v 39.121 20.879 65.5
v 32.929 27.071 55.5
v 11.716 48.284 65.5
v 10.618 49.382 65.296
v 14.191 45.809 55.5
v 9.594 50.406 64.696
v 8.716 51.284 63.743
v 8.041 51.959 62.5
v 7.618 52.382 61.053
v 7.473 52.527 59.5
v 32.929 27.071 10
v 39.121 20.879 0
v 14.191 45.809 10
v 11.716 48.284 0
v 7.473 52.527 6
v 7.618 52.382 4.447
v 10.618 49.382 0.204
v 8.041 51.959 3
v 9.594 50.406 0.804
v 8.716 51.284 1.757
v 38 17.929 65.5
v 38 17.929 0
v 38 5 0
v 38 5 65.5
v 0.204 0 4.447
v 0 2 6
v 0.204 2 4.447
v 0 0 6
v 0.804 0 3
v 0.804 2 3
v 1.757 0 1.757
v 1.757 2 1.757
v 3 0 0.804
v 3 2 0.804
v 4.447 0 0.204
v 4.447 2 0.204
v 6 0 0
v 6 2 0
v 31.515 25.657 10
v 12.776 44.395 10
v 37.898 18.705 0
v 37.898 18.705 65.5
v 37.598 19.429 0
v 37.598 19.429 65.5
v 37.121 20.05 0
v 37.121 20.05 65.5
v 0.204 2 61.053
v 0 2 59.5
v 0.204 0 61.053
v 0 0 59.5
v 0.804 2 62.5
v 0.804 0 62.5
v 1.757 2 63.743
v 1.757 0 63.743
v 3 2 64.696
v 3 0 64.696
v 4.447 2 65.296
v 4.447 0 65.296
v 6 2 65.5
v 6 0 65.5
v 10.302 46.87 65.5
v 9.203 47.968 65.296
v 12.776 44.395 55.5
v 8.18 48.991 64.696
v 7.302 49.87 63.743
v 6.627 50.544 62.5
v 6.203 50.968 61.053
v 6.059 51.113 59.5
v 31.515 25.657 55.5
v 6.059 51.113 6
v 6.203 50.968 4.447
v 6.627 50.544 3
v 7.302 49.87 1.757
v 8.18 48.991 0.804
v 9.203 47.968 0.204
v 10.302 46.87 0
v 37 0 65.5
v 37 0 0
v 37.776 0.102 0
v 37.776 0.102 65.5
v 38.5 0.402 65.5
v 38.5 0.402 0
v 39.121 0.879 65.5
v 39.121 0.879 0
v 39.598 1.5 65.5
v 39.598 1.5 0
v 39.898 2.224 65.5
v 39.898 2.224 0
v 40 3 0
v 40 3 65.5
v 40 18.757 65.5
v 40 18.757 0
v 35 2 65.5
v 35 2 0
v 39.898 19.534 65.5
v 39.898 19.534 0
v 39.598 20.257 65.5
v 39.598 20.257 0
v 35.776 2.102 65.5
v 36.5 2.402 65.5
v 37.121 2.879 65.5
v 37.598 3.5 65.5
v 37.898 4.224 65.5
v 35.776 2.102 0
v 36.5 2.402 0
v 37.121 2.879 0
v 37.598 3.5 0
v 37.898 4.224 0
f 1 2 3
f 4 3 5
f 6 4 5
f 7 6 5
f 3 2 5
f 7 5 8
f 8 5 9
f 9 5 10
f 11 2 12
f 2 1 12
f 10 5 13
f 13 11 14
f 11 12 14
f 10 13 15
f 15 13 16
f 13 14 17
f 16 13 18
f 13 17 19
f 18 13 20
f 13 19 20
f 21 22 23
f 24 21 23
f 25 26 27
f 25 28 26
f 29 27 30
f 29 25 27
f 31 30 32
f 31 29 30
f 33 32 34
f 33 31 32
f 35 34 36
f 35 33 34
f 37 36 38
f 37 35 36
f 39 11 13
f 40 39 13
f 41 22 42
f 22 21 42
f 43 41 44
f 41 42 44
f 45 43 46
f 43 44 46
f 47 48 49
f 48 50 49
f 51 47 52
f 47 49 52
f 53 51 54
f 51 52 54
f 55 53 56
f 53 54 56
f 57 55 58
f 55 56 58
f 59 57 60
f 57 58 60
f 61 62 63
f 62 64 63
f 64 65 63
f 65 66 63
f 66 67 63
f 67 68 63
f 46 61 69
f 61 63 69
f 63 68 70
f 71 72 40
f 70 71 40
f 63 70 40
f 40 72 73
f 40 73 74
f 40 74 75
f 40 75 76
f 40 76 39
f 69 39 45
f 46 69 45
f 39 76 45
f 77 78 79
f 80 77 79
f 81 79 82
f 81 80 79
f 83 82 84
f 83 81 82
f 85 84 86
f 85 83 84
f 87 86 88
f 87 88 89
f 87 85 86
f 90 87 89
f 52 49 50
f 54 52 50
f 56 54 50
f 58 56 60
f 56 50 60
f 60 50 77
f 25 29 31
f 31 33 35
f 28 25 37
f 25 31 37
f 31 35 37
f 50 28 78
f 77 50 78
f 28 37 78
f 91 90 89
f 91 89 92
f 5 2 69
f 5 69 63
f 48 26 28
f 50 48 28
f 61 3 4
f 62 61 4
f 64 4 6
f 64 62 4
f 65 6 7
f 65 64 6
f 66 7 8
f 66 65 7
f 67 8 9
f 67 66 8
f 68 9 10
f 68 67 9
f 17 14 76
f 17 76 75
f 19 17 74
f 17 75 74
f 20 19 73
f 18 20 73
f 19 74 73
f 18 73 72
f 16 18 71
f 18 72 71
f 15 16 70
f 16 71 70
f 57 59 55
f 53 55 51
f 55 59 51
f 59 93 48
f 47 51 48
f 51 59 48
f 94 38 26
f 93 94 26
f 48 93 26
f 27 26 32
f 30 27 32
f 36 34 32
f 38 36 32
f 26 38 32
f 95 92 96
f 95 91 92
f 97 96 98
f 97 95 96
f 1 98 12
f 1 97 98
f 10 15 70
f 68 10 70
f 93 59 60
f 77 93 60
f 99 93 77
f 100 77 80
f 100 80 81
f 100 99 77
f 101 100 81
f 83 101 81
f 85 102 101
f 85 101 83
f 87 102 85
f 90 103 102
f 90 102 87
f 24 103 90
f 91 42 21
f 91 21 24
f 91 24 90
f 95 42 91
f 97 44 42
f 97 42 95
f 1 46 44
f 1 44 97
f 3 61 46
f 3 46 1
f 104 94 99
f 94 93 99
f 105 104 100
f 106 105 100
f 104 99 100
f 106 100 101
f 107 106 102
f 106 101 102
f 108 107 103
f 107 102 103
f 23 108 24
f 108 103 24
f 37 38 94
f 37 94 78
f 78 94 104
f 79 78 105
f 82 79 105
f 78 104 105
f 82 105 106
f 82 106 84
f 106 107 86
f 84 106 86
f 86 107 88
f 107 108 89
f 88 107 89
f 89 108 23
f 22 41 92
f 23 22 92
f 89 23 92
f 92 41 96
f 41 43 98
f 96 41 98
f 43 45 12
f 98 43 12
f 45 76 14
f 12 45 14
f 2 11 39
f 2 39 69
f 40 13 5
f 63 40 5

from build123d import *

# Parameters (mm, degrees)
F1_DEPTH = 65.5
F2_W     = 26.5
F2_H     = 45.5
F3_DEPTH = 5
F4_R     = 6
F5_R     = 3


with BuildPart() as f1:
    # F0 (on Top) → F1 (new body)
    with BuildSketch(Plane.XY):
        Polygon((0, 2), (0, 0), (40, 0), (40, 20), (7.473088, 52.526912), (6.058875, 51.112698), (38, 19.171573), (38, 2), align=None)
    extrude(amount=F1_DEPTH)

    # F2 (on face) → F3 (cut)
    with BuildSketch(Plane(origin=(30, 30, 0), x_dir=(-0.707107, 0.707107, 0), z_dir=(0.707107, 0.707107, 0))):
        with Locations((9.107864, 32.75)):
            Rectangle(F2_W, F2_H)
    extrude(amount=-F3_DEPTH, mode=Mode.SUBTRACT)

    # F4
    f4_edges = [f1.edges().sort_by_distance(p)[0] for p in [
        (6.765981, 51.819805, 65.5),
        (6.765981, 51.819805, 0),
        (0, 1, 0),
        (0, 1, 65.5),
    ]]
    fillet(f4_edges, radius=F4_R)

    # F5
    f5_edges = [f1.edges().sort_by_distance(p)[0] for p in [
        (40, 20, 32.75),
        (38, 19.171573, 32.75),
        (38, 2, 32.75),
        (40, 0, 32.75),
    ]]
    fillet(f5_edges, radius=F5_R)


solid = f1.part
